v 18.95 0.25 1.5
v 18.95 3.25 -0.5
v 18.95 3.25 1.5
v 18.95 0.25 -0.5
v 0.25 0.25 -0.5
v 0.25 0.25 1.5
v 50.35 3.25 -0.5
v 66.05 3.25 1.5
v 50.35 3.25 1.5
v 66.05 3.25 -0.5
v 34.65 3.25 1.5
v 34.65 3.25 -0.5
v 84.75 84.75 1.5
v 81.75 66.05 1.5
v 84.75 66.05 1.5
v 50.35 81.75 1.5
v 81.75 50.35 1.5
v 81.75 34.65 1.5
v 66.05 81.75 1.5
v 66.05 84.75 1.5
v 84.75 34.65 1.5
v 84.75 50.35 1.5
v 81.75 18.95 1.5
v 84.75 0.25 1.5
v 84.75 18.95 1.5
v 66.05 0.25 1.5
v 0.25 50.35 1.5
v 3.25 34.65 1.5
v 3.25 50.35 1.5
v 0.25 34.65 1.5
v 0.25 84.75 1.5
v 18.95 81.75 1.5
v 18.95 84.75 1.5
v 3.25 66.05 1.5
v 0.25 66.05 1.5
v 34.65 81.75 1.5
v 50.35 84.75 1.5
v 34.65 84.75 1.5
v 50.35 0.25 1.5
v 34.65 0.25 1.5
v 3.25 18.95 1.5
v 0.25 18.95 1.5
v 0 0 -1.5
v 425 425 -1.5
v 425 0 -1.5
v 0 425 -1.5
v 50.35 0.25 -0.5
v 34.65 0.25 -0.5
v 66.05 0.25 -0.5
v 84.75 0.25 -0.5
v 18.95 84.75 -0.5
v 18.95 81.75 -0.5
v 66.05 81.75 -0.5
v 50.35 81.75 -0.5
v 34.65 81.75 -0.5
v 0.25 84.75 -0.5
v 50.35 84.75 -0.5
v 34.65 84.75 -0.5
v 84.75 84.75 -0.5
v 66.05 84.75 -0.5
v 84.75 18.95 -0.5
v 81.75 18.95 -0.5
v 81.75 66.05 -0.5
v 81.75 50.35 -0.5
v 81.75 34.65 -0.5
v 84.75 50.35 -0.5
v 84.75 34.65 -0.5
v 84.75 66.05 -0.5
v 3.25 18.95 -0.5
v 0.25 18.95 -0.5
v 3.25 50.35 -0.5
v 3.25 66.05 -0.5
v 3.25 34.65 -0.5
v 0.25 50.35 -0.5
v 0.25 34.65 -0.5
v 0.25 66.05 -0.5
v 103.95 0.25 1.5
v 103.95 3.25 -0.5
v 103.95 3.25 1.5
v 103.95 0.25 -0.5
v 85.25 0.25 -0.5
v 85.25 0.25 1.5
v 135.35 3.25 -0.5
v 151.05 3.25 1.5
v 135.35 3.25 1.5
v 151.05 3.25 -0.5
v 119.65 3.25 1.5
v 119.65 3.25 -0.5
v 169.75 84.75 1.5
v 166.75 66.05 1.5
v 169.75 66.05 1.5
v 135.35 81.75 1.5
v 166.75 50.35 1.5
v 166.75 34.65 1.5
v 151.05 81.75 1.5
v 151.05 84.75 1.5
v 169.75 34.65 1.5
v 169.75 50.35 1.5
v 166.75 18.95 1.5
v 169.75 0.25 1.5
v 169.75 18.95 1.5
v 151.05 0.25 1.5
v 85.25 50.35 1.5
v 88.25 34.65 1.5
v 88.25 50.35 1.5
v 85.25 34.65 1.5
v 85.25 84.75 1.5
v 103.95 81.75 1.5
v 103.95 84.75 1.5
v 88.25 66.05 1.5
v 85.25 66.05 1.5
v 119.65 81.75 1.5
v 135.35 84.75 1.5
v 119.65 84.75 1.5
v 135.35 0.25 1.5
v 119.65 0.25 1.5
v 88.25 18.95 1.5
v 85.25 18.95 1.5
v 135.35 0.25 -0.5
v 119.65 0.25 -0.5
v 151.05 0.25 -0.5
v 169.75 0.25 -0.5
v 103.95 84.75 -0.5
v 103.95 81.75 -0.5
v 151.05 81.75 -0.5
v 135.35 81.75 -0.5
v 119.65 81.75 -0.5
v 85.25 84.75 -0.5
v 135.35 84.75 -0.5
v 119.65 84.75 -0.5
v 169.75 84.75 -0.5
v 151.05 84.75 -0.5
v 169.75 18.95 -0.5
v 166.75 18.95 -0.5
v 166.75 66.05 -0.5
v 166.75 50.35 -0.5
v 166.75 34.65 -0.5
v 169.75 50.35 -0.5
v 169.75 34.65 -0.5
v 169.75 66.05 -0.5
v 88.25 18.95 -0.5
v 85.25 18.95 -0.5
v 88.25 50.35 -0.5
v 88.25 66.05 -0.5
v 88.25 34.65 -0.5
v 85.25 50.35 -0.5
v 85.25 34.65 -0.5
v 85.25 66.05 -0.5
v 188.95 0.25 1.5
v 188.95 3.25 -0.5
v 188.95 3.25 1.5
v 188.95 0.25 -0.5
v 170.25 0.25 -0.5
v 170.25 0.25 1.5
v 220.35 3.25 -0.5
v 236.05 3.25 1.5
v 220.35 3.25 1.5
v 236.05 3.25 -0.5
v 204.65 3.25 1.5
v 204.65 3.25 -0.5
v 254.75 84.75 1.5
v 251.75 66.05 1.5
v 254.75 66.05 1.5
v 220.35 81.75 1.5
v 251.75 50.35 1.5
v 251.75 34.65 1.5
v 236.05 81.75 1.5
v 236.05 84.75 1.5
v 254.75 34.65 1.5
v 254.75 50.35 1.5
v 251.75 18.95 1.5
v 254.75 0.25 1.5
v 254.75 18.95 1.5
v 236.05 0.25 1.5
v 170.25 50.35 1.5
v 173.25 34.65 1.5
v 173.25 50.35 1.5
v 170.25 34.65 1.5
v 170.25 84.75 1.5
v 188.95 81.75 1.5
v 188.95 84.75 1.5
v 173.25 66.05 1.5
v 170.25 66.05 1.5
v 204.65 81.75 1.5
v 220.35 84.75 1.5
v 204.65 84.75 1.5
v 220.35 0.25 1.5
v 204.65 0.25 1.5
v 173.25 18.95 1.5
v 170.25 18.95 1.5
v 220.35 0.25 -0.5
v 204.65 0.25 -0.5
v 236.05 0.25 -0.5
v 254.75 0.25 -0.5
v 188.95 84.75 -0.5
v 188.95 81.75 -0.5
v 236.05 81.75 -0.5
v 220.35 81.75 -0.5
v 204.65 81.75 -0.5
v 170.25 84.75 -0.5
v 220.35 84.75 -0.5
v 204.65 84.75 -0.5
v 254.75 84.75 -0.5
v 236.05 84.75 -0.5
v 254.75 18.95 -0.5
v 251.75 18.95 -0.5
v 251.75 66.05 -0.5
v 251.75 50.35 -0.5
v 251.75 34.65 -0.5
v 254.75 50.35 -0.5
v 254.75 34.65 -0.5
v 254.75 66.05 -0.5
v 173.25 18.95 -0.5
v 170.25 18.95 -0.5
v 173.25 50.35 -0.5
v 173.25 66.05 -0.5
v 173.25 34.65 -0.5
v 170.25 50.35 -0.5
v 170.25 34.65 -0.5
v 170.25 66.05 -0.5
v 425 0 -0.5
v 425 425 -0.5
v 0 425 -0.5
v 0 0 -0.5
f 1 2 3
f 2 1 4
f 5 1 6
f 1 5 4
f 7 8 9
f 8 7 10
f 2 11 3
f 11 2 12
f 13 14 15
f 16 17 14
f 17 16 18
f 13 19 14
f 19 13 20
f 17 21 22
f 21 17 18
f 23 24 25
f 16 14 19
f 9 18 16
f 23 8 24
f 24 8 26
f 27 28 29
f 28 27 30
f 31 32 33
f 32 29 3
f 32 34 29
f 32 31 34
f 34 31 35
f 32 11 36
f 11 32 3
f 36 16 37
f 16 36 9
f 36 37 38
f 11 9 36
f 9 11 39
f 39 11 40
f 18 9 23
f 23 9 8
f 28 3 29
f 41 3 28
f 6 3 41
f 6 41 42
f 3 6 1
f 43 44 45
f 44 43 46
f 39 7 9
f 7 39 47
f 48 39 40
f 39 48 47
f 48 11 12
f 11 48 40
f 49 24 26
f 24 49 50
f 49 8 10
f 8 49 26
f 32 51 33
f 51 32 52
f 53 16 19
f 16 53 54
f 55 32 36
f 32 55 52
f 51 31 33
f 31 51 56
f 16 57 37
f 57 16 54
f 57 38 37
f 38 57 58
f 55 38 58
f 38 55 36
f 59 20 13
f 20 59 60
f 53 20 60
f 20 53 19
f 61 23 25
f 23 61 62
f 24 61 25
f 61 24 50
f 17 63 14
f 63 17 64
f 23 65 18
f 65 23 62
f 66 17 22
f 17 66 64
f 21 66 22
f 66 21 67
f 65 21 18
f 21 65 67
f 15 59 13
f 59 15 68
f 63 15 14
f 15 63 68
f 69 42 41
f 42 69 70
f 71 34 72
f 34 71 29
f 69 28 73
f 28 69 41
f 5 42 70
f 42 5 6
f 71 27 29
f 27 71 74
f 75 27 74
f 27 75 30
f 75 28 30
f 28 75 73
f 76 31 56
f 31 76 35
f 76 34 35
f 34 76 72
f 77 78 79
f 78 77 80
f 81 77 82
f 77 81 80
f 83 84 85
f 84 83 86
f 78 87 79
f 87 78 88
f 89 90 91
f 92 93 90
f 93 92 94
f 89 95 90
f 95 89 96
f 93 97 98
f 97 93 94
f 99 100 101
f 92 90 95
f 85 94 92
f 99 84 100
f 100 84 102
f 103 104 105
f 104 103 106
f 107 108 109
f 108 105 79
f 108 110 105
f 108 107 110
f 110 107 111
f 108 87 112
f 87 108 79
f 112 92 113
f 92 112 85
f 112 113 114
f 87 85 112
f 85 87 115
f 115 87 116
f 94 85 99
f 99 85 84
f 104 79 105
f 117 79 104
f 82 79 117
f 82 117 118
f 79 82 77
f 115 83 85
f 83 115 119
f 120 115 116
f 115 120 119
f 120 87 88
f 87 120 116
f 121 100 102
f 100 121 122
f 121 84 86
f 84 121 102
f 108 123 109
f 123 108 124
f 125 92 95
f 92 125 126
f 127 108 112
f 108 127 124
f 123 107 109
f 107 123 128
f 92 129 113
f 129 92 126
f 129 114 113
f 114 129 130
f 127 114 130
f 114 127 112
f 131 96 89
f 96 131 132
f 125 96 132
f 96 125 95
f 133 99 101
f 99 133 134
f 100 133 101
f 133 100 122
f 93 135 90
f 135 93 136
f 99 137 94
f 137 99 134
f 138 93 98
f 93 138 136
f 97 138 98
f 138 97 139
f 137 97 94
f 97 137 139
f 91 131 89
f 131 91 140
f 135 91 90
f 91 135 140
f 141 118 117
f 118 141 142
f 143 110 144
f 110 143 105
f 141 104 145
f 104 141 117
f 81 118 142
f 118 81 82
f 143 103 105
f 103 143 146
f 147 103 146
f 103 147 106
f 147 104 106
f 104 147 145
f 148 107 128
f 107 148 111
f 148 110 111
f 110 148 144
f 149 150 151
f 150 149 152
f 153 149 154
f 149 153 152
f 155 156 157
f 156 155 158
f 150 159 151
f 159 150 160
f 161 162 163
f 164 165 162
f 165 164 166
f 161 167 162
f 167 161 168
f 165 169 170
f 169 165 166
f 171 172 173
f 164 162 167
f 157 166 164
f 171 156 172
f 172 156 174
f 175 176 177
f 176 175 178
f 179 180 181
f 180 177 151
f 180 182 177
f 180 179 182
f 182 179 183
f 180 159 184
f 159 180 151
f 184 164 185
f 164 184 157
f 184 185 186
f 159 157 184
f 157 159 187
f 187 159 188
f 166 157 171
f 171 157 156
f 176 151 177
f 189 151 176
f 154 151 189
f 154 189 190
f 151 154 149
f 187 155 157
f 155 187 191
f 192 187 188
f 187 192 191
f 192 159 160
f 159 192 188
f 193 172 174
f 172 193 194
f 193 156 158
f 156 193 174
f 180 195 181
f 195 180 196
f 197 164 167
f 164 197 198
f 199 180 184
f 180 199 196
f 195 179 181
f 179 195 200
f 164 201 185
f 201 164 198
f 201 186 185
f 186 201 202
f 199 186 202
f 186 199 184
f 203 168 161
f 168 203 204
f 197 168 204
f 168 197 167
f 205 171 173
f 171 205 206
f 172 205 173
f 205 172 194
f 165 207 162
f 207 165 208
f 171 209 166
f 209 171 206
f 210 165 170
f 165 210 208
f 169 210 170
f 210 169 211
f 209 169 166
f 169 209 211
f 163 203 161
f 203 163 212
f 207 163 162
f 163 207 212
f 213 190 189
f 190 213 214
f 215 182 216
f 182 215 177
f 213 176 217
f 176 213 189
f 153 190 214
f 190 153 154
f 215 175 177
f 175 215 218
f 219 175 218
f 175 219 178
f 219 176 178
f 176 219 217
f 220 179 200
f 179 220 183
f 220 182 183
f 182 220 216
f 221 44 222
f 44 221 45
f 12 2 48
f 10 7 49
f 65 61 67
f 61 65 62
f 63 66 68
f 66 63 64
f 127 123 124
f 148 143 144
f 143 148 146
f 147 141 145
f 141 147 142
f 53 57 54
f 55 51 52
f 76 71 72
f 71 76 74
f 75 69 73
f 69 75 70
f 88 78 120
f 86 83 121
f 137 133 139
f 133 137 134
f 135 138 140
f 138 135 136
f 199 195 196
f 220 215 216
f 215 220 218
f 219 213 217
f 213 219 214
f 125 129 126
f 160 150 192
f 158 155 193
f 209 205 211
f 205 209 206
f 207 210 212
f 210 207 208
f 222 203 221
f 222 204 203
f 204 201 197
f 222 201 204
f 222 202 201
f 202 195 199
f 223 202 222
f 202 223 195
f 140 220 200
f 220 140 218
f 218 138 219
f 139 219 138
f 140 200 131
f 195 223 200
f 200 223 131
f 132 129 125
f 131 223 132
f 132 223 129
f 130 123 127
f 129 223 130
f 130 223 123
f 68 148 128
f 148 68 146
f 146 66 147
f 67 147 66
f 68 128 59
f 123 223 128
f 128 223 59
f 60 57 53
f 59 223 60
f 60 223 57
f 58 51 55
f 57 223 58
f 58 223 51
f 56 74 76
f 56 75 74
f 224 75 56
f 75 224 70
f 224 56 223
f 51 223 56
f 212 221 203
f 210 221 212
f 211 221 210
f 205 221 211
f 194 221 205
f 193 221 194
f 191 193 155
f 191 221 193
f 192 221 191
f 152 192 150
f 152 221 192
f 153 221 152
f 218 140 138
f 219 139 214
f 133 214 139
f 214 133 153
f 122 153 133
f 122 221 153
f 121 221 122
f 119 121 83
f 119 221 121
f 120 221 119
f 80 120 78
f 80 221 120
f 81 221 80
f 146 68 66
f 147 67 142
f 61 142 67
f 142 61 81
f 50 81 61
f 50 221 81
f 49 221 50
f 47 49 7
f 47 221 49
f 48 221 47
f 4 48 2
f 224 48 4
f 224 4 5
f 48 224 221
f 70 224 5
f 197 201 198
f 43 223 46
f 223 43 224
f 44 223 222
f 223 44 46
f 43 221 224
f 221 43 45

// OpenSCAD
// file: noses.scad
include <config.scad>;

/**
 * Generates configured number of noses
 * centered, along X axis, to normalized total length of 1
 */
module nose_positive()
{
    begin_x = -0.5;
    delta_x = (1-relative_nose_length) / (nose_count-1);
    for (i=[0:nose_count-1])
    {
        translate([
            begin_x + i*delta_x,
            -material_z/2,
            -material_z/2
            ])
        cube([
            relative_nose_length,
            material_z,
            material_z
            ]);
    }
}

/**
 * Generates the counterpart to nose_positive()
 */
module nose_negative()
{
    // subtract nose_positive() from centered cuboid
    difference()
    {
        translate([
            -0.5,
            -material_z/2,
            -material_z/2
            ])
        cube([
            1,
            material_z,
            material_z
            ]);
        // a little overscale to get rid of rendering artifacts
        scale([
            1.001,
            1.001,
            1.001
            ])
        nose_positive();
    }
}

nose_negative();
// file: face_xz.scad
include <config.scad>;
use <noses.scad>;

/**
 * Generate the top and bottom face of the cuboid
 * with noses, centered around origin
 */
module face_xz()
{
    color("green")
    {
        cube([
            cuboid_x,
            material_z,
            cuboid_z
            ], center=true);

        scale([
            cuboid_x,
            1,
            1
            ])
        {
            translate([
                0,
                0,
                cuboid_z_2 + material_z_2
                ])
            nose_positive();

            translate([
                0,
                0,
                - cuboid_z_2 - material_z_2,
                ])
            nose_positive();
        }

        rotate([
            0,
            90,
            0
            ])
        scale([
            cuboid_z,
            1,
            1
            ])
        {
            translate([
                0,
                0,
                cuboid_x_2 + material_z_2
                ])
            nose_positive();

            translate([
                0,
                0,
                - cuboid_x_2 - material_z_2
                ])
            nose_positive();
        }

        /*
         * fill the corners
         */
        translate([
            - cuboid_x_2 - material_z_2,
            0,
            - cuboid_z_2 - material_z_2
            ])
        cube([
            material_z,
            material_z,
            material_z
            ], center=true);

        translate([
            - cuboid_x_2 - material_z_2,
            0,
            + cuboid_z_2 + material_z_2
            ])
        cube([
            material_z,
            material_z,
            material_z
            ], center=true);

        translate([
            + cuboid_x_2 + material_z_2,
            0,
            + cuboid_z_2 + material_z_2
            ])
        cube([
            material_z,
            material_z,
            material_z
            ], center=true);

        translate([
            + cuboid_x_2 + material_z_2,
            0,
            - cuboid_z_2 - material_z_2
            ])
        cube([
            material_z,
            material_z,
            material_z
            ], center=true);
    }
}

face_xz();
// file: face_yz.scad
include <config.scad>;
use <noses.scad>;

/**
 * Generate the top and bottom face of the cuboid
 * with noses, centered around origin
 */
module face_yz()
{
    color("red")
    {
        cube([
            material_z,
            cuboid_y,
            cuboid_z,
            ], center=true);

        rotate([
            0,
            0,
            90
            ])
        scale([
            cuboid_y,
            1,
            1
            ])
        {
            translate([
                0,
                0,
                cuboid_z_2 + material_z_2
                ])
            nose_positive();

            translate([
                0,
                0,
                - cuboid_z_2 - material_z_2
                ])
            nose_positive();
        }

        rotate([
            0,
            90,
            0
            ])
        scale([
            cuboid_z,
            1,
            1
            ])
        {
            translate([
                0,
                cuboid_y_2 + material_z_2,
                0
                ])
            nose_negative();

            translate([
                0,
                - cuboid_y_2 - material_z_2,
                0
                ])
            nose_negative();
        }
    }
}

face_yz();
// file: face_xy.scad
include <config.scad>;
use <noses.scad>;

/**
 * Generate the top and bottom face of the cuboid
 * with noses, centered around origin
 */
module face_xy()
{
    color("blue")
    {
        cube([
            cuboid_x,
            cuboid_y,
            material_z
            ], center=true);

        rotate([
            0,
            0,
            90
            ])
        scale([
            cuboid_y,
            1,
            1
            ])
        {
            translate([
                0,
                cuboid_x_2 + material_z_2,
                0
                ])
            nose_negative();

            translate([
                0,
                - cuboid_x_2 - material_z_2,
                0
                ])
            nose_negative();
        }

        scale([
            cuboid_x,
            1,
            1
            ])
        {
            translate([
                0,
                cuboid_y_2 + material_z_2,
                0
                ])
            nose_negative();

            translate([
                0,
                - cuboid_y_2 - material_z_2,
                0
                ])
            nose_negative();
        }
    }
}

face_xy();
// file: config.scad
// all measures in mm

/*
 * Base material to cut from
 */
material_x = 425;
material_y = 425;
material_z = 3;

/*
 * Shark model measures
 */
shark_width = 75;
shark_height = 54;
shark_length = 157;

/*
 * Cuboid measures (inside)
 */
cuboid_x = shark_length / 2;
cuboid_y = cuboid_x;
cuboid_z = cuboid_x;
//cuboid_y = shark_width;
//cuboid_z = shark_height + 20;

/*
 * Save some calculations
 */
cuboid_x_2 = cuboid_x / 2;
cuboid_y_2 = cuboid_y / 2;
cuboid_z_2 = cuboid_z / 2;
material_z_2 = material_z / 2;

/*
 * Nose properties
 */
// the number
nose_count = 3;
// width of a nose relative to length of the corresponding edge
relative_nose_length = 0.2;

/*
 * Rendering and projection properties
 */
// how far apart from on another to project the parts
projection_spacing = 0.5;
// how far from the border of the material to begin placing
projection_margin = 0.25;
// rendering quality (face number)
$fn = 50;
// main file
include <config.scad>;
use <face_xy.scad>;
use <face_yz.scad>;
use <face_xz.scad>;

module base_material()
{
    color("grey")
    translate([
        0,
        0,
        -1.5
        ])
    cube([
        material_x,
        material_y,
        1
        ]);
}

module layout()
{
    // vertical "cursor"
    a =  projection_margin;

    // model's z axis is now y
    translate([
        cuboid_x_2 + material_z + a,
        cuboid_z_2 + material_z + projection_margin,
        0
        ])
    // rotate into xy-plane
    rotate([
        90,
        0,
        0
        ])
    face_xz();

    b = a + cuboid_x + 2*material_z + projection_spacing;

    // model's z axis is now y
    translate([
        cuboid_x_2 + material_z + b,
        cuboid_z_2 + material_z + projection_margin,
        0
        ])
    // rotate into xy-plane
    rotate([
        90,
        0,
        0
        ])
    face_xz();

    c = b + cuboid_x + 2*material_z + projection_spacing;

    // model's z axis is now y
    translate([
        cuboid_x_2 + material_z + c,
        cuboid_z_2 + material_z + projection_margin,
        0
        ])
    // rotate into xy-plane
    rotate([
        90,
        0,
        0
        ])
    face_xz();
}

base_material();
layout();
